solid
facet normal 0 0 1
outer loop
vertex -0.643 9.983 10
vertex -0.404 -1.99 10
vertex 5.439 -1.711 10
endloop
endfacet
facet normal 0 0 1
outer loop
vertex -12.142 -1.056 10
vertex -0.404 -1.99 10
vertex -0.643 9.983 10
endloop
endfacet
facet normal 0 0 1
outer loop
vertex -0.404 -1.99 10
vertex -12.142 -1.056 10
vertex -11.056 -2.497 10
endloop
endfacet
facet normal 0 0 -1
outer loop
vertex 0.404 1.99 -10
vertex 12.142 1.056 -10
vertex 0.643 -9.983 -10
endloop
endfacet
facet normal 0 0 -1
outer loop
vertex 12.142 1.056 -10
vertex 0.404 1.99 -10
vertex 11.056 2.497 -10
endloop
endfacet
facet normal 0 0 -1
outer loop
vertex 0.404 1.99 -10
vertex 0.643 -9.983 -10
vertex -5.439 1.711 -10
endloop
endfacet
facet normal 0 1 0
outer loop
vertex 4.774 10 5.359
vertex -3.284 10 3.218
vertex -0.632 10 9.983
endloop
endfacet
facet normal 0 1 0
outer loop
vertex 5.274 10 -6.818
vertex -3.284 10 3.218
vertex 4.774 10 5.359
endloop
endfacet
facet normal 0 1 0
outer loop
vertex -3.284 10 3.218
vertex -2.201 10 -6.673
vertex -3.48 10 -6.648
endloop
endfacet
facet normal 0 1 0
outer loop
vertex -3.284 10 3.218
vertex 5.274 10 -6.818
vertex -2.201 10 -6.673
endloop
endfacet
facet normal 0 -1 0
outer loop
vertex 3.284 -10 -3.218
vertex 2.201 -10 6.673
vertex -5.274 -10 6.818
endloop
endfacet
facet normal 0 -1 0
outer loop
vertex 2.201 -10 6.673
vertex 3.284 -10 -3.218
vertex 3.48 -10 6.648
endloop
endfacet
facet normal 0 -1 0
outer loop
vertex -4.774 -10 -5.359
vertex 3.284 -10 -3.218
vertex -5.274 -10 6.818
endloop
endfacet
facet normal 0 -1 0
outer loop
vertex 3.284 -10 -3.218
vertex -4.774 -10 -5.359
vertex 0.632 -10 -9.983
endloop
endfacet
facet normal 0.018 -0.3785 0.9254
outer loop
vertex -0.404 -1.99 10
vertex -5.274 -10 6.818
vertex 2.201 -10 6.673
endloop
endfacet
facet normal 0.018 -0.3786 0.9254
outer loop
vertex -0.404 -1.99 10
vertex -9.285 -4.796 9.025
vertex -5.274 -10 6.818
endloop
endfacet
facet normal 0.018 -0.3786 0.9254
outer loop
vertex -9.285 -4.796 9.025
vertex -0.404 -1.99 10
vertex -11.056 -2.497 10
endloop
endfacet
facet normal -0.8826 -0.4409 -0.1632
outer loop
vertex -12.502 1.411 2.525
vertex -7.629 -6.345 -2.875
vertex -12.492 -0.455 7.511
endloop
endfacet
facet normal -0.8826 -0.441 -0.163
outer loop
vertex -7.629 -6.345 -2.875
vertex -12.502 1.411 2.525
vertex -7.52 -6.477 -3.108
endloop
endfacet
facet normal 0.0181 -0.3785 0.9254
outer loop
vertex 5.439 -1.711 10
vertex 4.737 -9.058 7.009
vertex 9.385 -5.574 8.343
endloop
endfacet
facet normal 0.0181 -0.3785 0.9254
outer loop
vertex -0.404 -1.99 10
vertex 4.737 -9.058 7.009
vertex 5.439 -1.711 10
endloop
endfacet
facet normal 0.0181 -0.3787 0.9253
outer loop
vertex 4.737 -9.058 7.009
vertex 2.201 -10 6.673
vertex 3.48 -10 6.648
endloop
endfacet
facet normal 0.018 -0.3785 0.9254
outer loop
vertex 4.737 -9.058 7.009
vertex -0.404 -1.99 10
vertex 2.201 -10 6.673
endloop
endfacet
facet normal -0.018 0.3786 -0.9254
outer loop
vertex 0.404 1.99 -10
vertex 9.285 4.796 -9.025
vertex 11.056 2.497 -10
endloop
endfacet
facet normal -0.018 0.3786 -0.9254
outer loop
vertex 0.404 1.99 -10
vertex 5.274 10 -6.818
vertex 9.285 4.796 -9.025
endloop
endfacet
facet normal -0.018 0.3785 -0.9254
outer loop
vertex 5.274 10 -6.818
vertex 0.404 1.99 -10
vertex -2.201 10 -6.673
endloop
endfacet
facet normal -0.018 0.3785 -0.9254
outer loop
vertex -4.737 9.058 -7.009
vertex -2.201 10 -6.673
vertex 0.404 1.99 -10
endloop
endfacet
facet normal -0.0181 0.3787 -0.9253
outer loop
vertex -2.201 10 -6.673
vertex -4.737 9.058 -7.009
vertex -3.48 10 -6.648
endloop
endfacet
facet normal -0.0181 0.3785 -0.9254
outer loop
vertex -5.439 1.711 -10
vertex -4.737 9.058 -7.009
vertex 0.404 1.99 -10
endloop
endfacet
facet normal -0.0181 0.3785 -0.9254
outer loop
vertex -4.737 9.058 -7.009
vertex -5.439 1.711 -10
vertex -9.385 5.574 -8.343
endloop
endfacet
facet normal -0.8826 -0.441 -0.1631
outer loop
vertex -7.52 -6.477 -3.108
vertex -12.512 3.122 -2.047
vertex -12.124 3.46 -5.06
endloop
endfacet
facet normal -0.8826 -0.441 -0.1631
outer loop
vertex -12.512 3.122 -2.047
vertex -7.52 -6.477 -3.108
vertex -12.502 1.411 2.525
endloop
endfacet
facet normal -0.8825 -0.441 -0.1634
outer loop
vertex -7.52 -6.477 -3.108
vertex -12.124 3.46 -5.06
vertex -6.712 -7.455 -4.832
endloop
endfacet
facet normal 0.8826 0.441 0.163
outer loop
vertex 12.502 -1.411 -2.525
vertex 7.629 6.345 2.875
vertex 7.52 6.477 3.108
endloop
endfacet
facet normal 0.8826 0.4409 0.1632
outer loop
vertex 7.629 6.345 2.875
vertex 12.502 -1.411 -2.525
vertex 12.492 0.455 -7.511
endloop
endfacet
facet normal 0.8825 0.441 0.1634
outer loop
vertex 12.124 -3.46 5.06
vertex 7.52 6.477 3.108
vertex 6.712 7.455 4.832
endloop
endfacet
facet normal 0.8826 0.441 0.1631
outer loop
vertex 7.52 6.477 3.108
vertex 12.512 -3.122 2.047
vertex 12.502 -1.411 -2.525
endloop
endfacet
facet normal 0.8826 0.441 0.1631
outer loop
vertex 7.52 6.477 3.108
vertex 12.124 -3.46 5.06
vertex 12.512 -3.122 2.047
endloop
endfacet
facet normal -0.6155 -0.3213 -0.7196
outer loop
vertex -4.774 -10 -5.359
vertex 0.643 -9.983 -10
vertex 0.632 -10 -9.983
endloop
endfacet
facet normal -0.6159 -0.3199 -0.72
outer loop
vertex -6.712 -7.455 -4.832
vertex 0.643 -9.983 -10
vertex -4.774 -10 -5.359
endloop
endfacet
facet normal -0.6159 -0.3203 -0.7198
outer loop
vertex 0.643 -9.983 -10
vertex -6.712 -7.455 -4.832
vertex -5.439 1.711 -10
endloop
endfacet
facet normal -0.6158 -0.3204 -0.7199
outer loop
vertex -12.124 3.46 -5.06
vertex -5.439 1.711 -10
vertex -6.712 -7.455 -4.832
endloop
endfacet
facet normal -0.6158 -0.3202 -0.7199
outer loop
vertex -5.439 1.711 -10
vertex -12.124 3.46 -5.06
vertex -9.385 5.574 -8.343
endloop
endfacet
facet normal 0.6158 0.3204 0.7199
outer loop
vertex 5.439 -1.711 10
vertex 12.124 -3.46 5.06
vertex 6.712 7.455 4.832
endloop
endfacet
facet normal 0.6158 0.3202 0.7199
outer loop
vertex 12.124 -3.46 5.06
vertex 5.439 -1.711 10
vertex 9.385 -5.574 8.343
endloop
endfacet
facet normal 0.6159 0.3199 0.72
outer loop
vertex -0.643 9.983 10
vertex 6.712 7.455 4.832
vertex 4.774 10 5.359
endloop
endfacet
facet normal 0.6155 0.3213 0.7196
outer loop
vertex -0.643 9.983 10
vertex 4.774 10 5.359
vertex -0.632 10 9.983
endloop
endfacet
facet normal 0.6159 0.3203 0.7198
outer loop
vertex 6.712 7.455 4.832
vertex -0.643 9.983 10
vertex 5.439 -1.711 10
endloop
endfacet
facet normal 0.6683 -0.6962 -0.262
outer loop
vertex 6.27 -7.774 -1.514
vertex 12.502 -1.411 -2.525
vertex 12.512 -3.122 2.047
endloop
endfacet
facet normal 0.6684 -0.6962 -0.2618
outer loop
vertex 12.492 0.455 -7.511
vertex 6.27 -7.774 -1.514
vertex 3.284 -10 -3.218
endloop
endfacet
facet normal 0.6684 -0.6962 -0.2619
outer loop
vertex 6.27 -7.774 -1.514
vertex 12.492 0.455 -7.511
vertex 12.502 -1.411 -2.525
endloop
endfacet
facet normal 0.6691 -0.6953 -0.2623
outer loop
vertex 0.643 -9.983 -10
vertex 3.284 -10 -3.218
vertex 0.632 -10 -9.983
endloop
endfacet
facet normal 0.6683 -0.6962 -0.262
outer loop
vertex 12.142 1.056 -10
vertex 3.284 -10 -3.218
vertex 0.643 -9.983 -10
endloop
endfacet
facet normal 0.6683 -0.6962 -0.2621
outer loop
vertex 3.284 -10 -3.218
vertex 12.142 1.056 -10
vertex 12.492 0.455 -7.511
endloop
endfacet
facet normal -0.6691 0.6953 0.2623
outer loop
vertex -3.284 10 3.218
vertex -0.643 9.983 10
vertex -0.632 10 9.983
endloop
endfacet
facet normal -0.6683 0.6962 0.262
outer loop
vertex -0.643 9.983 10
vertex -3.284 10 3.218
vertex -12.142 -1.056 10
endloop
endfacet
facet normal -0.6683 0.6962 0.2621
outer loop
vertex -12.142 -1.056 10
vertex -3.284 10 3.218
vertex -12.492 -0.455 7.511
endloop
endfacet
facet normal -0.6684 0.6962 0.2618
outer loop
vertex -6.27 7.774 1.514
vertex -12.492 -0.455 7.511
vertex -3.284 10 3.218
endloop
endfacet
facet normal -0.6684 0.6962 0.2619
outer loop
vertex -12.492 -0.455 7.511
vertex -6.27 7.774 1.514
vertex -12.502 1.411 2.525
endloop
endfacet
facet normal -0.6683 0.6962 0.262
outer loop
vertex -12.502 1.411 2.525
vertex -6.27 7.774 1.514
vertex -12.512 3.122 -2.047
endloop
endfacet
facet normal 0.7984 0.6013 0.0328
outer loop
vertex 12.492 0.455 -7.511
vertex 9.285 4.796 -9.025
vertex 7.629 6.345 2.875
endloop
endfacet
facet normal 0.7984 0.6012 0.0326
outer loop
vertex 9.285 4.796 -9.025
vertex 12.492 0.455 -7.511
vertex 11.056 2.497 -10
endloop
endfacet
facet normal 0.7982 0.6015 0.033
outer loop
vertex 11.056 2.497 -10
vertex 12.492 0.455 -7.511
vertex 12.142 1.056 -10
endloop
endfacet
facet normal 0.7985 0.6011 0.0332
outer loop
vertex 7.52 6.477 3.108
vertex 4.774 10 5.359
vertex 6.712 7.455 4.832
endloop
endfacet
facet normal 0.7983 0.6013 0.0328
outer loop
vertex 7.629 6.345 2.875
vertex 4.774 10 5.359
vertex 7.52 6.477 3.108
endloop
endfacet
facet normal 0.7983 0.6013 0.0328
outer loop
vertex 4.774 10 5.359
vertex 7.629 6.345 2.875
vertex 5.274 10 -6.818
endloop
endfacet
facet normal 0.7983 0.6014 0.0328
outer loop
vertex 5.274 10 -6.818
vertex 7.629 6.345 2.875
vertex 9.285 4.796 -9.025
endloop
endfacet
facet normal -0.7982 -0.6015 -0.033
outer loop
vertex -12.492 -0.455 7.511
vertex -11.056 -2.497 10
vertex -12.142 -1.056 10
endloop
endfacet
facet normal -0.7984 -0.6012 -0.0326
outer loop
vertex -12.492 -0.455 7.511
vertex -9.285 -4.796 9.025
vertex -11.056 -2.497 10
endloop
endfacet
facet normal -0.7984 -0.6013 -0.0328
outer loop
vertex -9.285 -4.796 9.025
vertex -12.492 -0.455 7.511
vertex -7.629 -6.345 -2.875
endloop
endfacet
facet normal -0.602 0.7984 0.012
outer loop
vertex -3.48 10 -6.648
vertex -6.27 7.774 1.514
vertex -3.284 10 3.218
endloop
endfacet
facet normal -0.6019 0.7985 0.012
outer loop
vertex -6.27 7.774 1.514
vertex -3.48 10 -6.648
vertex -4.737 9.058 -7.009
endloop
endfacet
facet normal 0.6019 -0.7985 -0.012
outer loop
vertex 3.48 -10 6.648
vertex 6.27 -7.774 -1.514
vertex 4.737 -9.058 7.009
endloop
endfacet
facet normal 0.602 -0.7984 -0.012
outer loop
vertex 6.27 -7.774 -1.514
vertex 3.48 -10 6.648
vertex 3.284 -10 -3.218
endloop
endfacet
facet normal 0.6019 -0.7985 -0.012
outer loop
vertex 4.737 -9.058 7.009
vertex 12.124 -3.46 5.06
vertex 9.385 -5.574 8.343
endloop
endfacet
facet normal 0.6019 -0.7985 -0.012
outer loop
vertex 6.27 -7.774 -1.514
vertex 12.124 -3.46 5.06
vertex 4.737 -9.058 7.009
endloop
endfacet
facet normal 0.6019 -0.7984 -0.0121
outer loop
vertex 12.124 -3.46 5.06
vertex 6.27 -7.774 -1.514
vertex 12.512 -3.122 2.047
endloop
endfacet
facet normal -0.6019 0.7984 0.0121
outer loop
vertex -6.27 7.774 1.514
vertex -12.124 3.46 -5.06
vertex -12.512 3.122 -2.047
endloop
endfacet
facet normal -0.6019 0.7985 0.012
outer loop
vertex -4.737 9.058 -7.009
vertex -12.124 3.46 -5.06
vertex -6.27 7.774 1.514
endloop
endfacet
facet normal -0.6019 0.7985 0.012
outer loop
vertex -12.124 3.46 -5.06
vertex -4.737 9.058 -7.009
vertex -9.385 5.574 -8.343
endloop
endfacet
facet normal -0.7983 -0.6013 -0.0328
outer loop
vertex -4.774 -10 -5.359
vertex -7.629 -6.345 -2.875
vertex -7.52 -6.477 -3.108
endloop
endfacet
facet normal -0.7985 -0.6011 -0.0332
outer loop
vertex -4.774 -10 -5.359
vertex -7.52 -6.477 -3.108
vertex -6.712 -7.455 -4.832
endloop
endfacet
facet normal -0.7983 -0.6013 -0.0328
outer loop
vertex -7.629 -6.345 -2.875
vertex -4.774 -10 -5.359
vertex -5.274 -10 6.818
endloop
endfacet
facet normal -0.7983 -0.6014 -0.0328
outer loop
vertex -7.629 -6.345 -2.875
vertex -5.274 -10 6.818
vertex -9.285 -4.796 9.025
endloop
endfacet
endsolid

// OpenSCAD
intersection_for(i = [[0, 0, 0],
                      [10, 20, 300],
                      [200, 40, 57],
                      [20, 88, 57]])
  rotate(i) cube([100, 20, 20], center = true);
